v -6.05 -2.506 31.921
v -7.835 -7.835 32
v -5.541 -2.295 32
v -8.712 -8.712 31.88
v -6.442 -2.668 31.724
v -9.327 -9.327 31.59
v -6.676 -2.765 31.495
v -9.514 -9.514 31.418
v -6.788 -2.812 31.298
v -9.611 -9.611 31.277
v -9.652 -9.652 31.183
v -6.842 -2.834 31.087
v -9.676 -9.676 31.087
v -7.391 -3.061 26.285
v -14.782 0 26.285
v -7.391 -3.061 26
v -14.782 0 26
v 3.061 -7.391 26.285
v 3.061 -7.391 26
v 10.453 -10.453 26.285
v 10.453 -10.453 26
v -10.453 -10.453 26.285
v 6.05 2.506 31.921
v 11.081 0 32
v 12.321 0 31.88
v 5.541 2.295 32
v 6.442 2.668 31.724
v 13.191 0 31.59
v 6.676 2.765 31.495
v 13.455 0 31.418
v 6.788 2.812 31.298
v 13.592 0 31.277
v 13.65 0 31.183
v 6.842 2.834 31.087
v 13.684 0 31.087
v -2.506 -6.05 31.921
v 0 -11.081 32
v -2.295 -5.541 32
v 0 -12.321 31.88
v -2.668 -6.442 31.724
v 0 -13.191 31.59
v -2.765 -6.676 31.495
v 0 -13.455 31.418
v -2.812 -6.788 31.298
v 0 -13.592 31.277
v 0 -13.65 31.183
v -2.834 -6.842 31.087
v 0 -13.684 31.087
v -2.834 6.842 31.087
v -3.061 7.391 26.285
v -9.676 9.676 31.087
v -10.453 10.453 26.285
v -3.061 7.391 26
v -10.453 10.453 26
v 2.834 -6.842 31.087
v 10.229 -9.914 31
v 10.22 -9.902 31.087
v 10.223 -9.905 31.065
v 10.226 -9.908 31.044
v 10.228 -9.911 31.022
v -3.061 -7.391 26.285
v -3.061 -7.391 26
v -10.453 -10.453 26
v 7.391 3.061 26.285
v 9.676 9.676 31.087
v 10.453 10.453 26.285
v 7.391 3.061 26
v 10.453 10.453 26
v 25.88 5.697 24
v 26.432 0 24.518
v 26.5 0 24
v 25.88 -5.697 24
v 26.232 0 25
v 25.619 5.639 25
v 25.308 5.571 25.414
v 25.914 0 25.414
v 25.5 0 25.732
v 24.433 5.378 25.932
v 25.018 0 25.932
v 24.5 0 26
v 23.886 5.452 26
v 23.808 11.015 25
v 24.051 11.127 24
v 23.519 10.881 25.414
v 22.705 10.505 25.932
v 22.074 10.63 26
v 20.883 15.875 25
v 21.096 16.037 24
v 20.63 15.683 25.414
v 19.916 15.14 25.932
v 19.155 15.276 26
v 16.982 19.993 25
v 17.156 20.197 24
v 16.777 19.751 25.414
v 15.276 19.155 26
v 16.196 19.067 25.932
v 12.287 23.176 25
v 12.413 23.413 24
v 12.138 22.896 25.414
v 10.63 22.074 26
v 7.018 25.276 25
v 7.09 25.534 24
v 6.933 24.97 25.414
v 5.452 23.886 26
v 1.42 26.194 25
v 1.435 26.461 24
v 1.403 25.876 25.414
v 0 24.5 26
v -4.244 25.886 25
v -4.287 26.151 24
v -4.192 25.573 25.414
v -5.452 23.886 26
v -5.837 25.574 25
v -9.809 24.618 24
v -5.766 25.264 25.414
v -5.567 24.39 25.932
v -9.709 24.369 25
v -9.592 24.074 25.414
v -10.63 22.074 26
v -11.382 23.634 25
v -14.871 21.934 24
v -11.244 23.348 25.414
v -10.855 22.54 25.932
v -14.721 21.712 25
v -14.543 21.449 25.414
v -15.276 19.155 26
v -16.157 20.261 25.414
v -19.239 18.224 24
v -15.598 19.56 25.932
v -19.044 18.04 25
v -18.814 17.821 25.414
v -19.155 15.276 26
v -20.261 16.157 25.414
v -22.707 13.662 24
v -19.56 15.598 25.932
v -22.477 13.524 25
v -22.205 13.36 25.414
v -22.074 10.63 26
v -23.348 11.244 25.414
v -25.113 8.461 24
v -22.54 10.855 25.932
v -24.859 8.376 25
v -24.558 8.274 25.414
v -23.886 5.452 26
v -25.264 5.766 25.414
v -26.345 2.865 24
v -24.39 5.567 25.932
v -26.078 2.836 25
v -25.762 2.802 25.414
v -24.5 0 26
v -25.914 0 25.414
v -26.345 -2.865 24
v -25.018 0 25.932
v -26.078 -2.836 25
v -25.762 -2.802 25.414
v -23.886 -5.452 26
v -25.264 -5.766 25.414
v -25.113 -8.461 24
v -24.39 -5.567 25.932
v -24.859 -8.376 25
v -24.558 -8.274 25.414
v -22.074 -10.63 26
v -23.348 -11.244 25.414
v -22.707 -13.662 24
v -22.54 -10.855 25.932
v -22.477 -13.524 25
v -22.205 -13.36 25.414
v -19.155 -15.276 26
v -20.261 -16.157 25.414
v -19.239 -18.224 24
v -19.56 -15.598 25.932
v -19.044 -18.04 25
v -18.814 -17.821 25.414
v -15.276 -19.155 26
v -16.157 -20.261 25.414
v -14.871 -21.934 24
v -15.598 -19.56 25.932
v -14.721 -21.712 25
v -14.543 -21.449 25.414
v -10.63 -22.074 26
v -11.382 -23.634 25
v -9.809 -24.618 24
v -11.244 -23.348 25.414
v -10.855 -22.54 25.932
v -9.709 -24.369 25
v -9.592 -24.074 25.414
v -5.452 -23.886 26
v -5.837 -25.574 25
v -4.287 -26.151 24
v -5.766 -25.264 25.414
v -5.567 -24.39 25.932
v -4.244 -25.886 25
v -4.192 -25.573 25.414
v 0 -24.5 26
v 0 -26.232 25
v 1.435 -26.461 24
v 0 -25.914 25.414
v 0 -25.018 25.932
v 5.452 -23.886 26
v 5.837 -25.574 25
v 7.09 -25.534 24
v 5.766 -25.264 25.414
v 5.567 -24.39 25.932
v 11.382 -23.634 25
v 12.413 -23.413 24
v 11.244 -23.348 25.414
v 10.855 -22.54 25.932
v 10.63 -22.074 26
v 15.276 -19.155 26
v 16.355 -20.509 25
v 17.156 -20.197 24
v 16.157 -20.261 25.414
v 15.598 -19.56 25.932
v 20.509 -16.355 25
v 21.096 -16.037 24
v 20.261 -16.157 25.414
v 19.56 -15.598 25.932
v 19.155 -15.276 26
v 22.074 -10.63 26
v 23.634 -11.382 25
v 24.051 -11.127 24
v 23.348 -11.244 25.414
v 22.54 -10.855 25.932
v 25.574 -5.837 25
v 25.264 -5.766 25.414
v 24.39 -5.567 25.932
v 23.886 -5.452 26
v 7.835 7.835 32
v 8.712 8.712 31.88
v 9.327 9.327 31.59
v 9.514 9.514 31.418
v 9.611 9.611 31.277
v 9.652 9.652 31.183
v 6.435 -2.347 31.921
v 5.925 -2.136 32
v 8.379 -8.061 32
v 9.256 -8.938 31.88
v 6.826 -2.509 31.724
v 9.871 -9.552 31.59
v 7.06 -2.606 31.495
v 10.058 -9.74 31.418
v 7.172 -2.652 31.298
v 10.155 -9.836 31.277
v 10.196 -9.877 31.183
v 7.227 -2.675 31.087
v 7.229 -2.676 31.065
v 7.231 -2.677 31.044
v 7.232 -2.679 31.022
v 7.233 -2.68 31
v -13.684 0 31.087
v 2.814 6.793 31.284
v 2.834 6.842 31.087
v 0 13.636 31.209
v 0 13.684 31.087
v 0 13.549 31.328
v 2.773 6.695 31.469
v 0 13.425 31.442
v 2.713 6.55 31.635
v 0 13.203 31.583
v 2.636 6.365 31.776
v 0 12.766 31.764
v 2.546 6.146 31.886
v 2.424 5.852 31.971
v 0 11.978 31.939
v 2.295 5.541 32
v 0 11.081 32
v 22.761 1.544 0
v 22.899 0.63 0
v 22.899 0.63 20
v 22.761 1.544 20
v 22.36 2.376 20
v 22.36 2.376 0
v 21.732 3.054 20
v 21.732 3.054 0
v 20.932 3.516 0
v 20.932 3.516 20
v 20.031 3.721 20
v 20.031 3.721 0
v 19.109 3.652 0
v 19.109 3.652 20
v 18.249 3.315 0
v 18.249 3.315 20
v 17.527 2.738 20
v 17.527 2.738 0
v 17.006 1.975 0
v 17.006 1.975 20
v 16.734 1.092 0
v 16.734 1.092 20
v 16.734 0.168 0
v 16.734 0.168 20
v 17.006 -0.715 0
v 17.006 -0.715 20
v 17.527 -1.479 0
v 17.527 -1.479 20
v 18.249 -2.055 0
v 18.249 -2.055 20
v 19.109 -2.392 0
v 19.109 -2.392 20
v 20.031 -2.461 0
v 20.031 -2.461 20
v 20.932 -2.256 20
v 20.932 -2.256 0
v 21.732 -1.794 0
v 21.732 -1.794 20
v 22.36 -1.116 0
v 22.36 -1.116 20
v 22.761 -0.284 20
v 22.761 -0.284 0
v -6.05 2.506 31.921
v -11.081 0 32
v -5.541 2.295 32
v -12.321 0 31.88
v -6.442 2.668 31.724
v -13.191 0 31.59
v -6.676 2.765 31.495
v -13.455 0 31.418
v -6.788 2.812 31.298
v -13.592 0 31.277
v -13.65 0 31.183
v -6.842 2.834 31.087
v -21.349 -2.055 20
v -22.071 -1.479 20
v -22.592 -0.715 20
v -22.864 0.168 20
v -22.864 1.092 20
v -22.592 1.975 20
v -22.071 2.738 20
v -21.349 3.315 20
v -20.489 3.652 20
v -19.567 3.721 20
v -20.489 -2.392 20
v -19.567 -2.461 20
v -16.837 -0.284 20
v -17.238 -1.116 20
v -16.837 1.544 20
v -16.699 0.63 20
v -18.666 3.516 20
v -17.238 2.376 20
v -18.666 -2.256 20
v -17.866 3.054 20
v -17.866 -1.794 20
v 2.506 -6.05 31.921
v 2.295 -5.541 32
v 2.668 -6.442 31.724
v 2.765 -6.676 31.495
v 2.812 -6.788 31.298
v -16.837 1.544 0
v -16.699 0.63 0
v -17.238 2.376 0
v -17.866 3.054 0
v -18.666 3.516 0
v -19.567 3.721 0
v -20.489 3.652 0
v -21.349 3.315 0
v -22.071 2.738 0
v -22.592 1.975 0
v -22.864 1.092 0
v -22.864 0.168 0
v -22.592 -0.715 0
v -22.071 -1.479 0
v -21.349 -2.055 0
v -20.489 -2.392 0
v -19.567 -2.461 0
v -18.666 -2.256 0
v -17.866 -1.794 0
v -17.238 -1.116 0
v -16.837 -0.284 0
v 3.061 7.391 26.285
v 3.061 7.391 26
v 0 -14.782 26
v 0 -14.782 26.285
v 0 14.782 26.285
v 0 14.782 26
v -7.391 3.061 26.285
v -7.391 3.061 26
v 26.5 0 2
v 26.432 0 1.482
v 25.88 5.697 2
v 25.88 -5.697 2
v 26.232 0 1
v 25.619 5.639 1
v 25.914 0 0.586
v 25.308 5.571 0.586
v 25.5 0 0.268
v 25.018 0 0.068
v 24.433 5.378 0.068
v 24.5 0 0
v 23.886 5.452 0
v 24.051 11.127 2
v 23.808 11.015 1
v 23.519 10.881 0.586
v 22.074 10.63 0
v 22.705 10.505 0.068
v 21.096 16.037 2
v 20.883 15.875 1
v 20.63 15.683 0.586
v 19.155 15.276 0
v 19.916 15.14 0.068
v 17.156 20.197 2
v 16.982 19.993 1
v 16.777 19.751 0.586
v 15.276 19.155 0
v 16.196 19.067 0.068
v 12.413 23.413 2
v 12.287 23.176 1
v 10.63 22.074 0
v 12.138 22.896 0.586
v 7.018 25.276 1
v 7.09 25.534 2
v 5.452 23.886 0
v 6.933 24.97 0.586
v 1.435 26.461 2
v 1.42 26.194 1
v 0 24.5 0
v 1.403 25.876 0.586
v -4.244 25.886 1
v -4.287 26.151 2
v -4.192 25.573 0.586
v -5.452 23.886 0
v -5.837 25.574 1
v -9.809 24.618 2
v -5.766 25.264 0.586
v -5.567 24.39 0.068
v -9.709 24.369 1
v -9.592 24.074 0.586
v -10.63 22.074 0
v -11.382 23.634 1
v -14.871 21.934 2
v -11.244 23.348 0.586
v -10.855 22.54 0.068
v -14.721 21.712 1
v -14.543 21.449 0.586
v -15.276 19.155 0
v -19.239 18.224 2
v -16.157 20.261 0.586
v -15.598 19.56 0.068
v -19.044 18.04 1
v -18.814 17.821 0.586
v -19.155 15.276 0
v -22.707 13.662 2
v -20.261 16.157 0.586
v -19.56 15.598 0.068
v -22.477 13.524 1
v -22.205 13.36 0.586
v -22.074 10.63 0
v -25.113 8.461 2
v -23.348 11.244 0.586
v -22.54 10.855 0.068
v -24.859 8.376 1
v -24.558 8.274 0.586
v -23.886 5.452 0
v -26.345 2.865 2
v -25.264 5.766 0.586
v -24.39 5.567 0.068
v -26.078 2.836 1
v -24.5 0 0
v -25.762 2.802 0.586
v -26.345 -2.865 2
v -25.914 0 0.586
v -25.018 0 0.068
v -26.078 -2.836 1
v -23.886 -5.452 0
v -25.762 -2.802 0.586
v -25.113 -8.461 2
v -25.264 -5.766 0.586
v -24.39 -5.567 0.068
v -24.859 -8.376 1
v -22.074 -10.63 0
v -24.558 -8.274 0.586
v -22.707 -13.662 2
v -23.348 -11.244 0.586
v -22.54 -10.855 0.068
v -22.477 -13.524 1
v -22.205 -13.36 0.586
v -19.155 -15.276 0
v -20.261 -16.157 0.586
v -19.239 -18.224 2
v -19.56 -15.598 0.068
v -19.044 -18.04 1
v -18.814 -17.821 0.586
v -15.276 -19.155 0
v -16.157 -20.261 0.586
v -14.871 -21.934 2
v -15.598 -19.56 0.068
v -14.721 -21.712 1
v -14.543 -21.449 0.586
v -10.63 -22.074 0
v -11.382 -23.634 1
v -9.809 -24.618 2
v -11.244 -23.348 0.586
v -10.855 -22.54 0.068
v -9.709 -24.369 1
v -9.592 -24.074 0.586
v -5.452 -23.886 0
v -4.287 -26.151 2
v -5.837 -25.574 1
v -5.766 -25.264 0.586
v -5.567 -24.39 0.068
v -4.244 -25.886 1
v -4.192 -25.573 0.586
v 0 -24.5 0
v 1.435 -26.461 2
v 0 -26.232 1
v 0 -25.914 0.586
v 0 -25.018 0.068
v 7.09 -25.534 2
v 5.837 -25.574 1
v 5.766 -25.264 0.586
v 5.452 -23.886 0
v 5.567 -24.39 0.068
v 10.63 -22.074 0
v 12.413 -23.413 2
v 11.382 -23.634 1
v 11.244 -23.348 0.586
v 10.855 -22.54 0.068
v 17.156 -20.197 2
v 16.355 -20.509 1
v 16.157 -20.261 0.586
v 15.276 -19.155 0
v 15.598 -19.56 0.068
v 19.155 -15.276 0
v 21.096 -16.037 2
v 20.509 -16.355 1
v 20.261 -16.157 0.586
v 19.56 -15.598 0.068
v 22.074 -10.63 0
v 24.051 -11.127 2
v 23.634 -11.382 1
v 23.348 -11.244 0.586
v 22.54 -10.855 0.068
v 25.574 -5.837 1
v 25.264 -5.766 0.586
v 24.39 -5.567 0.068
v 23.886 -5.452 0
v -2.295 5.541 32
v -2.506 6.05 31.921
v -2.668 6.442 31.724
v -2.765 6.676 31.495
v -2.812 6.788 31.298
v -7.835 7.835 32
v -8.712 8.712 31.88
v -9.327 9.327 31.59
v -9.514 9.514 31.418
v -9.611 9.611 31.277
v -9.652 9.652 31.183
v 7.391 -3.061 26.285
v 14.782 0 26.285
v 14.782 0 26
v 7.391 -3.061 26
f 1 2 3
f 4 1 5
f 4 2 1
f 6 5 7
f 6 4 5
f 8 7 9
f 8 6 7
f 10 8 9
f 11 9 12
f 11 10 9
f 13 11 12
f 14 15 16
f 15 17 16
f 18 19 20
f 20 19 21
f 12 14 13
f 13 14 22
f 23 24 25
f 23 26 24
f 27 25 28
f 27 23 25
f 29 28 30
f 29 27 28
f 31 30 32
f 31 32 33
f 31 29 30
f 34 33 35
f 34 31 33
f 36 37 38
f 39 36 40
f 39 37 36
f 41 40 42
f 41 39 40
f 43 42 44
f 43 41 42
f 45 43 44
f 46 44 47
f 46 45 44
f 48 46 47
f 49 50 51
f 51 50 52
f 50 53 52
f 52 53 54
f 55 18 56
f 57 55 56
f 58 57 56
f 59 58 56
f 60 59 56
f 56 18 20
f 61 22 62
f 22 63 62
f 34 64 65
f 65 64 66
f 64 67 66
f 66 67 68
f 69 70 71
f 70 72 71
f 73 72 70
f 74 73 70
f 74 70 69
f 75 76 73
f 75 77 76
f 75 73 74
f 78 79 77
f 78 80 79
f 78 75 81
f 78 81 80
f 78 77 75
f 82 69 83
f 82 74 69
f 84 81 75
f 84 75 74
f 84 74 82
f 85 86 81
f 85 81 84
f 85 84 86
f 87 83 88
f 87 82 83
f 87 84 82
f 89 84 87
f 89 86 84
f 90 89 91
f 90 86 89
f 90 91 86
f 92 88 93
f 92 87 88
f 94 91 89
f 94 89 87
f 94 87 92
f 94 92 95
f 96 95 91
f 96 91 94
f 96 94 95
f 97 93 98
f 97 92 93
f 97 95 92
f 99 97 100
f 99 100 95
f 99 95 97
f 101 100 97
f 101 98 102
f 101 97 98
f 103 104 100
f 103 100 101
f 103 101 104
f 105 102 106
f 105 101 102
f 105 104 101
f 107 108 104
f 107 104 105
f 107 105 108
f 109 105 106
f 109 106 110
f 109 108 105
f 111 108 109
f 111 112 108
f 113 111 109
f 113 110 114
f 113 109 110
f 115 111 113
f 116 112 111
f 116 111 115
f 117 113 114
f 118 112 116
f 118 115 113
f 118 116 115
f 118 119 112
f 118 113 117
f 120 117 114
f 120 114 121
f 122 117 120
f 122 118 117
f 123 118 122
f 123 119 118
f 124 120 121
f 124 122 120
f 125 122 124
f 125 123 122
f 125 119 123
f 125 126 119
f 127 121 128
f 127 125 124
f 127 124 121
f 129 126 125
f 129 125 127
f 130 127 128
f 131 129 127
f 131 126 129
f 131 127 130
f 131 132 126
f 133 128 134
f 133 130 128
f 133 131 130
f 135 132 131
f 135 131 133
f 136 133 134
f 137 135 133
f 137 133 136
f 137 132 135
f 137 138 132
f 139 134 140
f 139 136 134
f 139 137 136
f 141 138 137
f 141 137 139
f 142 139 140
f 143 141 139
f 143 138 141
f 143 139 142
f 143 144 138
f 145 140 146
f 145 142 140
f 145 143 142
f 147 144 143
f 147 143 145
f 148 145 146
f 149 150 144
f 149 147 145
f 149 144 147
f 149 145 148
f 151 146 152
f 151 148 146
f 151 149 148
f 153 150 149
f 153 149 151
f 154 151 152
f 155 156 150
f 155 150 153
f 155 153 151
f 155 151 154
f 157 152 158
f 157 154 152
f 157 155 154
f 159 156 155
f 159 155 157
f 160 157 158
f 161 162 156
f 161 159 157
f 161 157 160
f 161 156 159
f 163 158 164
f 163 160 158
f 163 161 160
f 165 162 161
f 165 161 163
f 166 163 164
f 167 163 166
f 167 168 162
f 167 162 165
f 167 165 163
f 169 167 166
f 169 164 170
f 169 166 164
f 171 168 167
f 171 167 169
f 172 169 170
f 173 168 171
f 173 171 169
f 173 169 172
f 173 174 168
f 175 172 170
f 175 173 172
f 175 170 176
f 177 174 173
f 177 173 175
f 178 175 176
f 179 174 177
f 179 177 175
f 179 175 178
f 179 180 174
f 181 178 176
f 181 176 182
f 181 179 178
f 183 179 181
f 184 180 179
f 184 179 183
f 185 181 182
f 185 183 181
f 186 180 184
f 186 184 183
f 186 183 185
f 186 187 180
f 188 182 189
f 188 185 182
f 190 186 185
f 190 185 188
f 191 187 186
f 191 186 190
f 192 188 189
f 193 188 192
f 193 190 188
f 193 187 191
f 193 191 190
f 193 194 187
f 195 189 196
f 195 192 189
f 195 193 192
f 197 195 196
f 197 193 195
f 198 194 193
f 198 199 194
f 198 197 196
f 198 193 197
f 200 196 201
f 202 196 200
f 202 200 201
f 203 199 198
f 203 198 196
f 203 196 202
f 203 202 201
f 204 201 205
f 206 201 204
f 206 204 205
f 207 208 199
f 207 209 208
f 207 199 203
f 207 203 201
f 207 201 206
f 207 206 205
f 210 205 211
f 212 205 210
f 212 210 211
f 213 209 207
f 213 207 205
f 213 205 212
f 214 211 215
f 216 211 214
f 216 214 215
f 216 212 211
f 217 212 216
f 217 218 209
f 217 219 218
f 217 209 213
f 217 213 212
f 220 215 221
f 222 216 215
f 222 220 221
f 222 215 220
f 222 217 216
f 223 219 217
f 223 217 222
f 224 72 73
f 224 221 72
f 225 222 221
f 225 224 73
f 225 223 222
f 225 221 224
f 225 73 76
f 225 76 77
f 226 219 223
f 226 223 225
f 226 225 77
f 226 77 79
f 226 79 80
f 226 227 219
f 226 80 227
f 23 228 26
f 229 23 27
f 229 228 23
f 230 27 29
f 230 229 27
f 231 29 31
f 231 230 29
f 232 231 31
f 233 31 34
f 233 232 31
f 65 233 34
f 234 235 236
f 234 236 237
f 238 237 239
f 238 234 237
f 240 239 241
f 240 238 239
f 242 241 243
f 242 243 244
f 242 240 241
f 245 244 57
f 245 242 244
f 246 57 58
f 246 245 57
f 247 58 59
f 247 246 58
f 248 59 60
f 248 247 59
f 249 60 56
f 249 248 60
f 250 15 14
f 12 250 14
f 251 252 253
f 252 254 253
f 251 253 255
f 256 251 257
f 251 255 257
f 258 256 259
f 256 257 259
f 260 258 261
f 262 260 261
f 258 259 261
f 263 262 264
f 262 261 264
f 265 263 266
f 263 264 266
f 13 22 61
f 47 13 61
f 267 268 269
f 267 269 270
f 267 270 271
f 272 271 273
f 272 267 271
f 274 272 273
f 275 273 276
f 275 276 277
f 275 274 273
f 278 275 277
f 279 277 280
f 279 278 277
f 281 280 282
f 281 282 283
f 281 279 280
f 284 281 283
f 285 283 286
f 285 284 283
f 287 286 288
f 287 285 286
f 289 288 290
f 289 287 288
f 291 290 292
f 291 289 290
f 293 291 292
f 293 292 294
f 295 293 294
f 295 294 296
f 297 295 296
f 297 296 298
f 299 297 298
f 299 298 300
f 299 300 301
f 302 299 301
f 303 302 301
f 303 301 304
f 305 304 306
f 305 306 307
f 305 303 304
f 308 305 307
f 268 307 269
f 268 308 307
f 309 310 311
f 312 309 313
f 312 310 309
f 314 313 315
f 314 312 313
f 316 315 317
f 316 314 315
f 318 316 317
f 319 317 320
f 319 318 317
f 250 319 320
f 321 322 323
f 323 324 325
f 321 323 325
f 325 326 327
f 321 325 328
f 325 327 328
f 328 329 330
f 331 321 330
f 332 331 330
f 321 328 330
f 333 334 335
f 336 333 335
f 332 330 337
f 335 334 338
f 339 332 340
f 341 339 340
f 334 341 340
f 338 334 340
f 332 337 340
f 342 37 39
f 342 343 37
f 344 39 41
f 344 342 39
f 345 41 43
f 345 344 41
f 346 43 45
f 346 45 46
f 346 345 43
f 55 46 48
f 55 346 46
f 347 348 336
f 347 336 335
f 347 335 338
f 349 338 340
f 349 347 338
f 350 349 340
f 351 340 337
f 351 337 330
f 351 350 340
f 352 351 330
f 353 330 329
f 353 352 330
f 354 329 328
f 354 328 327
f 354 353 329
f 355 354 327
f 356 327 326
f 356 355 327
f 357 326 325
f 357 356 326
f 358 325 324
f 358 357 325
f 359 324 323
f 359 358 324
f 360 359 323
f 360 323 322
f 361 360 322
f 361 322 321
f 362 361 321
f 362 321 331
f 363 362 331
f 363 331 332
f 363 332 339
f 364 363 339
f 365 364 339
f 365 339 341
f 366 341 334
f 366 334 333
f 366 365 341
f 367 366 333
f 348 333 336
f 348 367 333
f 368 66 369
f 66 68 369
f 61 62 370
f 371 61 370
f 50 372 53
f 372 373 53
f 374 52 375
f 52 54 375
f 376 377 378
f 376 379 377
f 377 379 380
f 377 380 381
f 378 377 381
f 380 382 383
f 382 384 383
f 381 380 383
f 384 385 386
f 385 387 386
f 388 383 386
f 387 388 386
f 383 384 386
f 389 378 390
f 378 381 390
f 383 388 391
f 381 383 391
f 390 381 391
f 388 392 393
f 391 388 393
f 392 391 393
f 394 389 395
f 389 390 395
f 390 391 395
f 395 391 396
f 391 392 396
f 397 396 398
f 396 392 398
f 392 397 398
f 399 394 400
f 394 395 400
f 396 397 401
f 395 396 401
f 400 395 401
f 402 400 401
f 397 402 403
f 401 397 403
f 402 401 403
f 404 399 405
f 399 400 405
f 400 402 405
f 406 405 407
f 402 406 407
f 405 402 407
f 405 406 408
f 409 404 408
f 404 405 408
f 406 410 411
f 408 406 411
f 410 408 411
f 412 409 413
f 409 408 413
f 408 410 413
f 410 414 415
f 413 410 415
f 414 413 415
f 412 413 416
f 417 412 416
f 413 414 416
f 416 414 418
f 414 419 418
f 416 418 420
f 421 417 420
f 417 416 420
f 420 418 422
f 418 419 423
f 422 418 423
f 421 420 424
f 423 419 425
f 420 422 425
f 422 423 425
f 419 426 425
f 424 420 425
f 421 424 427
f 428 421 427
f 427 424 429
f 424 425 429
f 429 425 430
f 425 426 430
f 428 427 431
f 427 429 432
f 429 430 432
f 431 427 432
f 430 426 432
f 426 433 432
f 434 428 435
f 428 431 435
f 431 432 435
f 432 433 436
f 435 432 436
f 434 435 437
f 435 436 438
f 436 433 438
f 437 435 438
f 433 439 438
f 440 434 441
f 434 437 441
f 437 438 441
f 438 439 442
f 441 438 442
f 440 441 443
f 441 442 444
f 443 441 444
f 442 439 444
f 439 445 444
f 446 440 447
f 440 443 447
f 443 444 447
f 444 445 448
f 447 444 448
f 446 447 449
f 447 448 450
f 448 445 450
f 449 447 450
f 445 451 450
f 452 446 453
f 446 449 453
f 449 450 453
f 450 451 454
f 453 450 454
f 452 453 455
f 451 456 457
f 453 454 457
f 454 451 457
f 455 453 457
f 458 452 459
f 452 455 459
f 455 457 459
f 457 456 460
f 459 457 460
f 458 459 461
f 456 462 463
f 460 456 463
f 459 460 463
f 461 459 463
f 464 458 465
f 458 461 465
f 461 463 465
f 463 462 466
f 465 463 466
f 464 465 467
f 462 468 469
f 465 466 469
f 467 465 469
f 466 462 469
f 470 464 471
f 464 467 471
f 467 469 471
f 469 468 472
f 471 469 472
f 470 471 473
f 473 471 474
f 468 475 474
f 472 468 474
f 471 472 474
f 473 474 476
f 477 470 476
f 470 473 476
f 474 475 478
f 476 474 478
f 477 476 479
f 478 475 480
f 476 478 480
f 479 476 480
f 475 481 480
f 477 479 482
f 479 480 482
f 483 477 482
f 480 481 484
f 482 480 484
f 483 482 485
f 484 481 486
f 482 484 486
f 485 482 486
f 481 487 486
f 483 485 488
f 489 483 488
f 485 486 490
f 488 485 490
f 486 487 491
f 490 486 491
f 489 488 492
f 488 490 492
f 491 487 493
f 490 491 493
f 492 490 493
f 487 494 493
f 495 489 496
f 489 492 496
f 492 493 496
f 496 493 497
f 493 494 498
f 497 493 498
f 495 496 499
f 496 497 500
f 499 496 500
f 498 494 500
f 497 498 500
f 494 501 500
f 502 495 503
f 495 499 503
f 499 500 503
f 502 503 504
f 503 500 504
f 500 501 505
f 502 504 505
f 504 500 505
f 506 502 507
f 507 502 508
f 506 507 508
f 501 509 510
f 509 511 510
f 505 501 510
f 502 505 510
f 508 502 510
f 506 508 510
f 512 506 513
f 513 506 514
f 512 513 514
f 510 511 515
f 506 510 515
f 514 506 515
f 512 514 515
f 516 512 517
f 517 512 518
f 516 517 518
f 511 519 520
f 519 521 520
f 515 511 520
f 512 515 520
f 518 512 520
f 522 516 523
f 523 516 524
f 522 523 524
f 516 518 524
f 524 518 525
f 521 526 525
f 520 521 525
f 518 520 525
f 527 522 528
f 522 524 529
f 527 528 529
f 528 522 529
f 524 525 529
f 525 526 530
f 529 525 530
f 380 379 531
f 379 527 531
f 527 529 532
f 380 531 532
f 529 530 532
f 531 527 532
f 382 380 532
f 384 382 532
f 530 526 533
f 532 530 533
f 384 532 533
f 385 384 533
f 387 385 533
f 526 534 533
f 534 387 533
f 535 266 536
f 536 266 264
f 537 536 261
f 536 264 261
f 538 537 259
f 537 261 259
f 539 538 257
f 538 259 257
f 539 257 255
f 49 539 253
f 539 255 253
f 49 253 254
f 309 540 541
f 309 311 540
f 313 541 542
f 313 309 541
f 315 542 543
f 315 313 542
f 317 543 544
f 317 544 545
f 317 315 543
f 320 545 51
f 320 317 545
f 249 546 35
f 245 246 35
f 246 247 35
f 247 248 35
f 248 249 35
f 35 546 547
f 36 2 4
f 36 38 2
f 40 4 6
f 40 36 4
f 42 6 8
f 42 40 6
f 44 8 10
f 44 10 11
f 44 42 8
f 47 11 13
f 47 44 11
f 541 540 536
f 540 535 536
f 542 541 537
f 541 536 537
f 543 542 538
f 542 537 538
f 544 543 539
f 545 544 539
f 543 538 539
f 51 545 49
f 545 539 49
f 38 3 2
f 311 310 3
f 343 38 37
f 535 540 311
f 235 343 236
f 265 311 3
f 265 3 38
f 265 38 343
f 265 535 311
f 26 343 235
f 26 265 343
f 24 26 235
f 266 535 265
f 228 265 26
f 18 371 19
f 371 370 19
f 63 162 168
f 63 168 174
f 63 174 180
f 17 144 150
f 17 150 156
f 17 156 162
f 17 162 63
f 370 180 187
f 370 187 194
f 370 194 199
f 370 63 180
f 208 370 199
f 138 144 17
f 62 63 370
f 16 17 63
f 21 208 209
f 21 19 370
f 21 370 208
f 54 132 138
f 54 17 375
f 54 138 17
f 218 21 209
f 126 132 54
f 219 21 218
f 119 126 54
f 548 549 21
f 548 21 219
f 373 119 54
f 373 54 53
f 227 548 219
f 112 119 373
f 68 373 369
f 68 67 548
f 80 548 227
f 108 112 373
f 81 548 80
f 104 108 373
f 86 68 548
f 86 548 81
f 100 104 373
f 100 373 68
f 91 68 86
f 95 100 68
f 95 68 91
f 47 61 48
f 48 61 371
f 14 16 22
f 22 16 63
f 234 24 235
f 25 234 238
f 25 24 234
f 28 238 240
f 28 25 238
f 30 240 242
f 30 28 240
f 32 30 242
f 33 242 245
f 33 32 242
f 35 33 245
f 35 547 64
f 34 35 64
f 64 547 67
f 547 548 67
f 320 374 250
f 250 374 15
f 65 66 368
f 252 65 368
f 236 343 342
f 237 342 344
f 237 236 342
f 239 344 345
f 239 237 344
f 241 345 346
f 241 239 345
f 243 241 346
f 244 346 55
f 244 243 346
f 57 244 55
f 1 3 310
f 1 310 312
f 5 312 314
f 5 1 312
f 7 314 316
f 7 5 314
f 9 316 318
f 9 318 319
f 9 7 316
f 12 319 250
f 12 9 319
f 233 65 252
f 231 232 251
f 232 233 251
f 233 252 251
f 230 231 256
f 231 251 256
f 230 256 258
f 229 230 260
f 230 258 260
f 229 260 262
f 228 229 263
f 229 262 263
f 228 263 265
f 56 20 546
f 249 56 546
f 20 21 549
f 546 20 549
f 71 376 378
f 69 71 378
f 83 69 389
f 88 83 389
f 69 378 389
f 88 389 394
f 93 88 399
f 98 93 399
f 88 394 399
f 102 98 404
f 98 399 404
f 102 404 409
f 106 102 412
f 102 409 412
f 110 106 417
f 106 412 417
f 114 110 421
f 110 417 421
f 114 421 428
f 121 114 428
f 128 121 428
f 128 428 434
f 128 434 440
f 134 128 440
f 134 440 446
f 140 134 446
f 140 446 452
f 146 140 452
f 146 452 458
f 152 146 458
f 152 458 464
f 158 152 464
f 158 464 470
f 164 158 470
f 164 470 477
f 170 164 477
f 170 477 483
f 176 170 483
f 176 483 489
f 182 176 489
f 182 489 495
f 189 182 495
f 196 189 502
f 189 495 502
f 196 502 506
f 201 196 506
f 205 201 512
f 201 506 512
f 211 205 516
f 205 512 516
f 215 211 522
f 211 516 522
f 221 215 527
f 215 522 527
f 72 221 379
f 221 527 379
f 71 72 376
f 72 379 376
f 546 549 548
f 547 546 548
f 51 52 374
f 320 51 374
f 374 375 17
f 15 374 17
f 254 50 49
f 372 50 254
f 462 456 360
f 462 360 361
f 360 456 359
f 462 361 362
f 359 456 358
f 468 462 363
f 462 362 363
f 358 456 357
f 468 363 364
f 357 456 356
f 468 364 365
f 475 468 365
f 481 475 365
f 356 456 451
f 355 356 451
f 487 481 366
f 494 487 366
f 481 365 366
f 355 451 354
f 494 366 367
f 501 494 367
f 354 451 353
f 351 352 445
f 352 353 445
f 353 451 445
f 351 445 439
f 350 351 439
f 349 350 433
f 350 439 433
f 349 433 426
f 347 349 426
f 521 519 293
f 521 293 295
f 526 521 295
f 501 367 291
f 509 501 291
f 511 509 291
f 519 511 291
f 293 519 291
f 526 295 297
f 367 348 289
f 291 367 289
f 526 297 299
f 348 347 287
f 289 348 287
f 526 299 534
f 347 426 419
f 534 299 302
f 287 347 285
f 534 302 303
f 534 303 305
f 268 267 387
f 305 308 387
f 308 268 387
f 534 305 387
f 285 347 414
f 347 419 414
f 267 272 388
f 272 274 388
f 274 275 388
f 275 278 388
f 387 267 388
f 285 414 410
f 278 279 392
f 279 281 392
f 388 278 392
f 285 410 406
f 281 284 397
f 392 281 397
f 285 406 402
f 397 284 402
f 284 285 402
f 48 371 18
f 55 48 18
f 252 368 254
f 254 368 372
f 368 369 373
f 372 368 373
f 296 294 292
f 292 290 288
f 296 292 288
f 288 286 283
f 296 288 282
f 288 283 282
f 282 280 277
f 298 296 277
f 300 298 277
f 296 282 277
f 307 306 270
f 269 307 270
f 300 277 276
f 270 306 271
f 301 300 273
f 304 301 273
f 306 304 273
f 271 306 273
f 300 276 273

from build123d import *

# Parameters (mm, degrees)
F0_R     = 26.5
F0_R_2   = 3.1
F1_DEPTH = 20
F2_R     = 26.5
F3_DEPTH = 6
F4_R     = 2
F6_DEPTH = 6
F7_SIZE2 = 5.7150261514
F7_SIZE  = 0.5
F8_SIZE2 = 5.7150261514
F8_SIZE  = 0.5
F9_R     = 1


with BuildPart() as f1:
    # F0 (on Top) → F1 (new body)
    with BuildSketch(Plane.XY):
        Circle(F0_R)
        with Locations((-19.7989898732, 0.6299423149)):
            Circle(F0_R_2, mode=Mode.SUBTRACT)
        with Locations((19.7989898732, 0.6299423149)):
            Circle(F0_R_2, mode=Mode.SUBTRACT)
    extrude(amount=F1_DEPTH)

    # F2 (on face) → F3 (join)
    with BuildSketch(Plane.XY.offset(20)):
        Circle(F2_R)
    extrude(amount=F3_DEPTH)

    # F4
    f4_edges = [f1.edges().sort_by_distance(p)[0] for p in [
        (-26.5, 0, 26),
        (-26.5, 0, 0),
    ]]
    fillet(f4_edges, radius=F4_R)

    # F5 (on face) → F6 (join)
    with BuildSketch(Plane.XY.offset(26)):
        Polygon((0, 14.7820725202), (-3.0614674589, 7.3910362601), (-10.452503719, 10.452503719), (-7.3910362601, 3.0614674589), (-14.7820725202, 0), (-7.3910362601, -3.0614674589), (-10.452503719, -10.452503719), (-3.0614674589, -7.3910362601), (0, -14.7820725202), (3.0614674589, -7.3910362601), (10.452503719, -10.452503719), (7.3910362601, -3.0614674589), (14.7820725202, 0), (7.3910362601, 3.0614674589), (10.452503719, 10.452503719), (3.0614674589, 7.3910362601), align=None)
    extrude(amount=F6_DEPTH)

    # F7
    f7_edges = [f1.edges().sort_by_distance(p)[0] for p in [
        (6.756986, -8.92177, 32),
        (-1.530734, -11.086554, 32),
        (-8.92177, -6.756986, 32),
        (-11.086554, 1.530734, 32),
        (-6.756986, 8.92177, 32),
        (1.530734, 11.086554, 32),
        (8.92177, 6.756986, 32),
        (11.086554, -1.530734, 32),
    ]]
    f7_side = f1.faces().sort_by_distance((0, 0, 32))[0]
    chamfer(f7_edges, length=F7_SIZE, length2=F7_SIZE2, reference=f7_side)

    # F8
    f8_edges = [f1.edges().sort_by_distance(p)[0] for p in [
        (1.666033, -10.759914, 32),
        (-6.430345, -8.786471, 32),
        (-10.759914, -1.666033, 32),
        (-8.786471, 6.430345, 32),
        (-1.666033, 10.759914, 32),
        (6.430345, 8.786471, 32),
        (10.759914, 1.666033, 32),
    ]]
    f8_side = f1.faces().sort_by_distance((0, 0, 32))[0]
    chamfer(f8_edges, length=F8_SIZE, length2=F8_SIZE2, reference=f8_side)

    # F9
    f9_edges = [f1.edges().sort_by_distance(p)[0] for p in [
        (10.337602, -1.299764, 32),
        (10.337602, 1.299764, 32),
        (7.295365, -2.830498, 32),
        (6.968725, 2.695199, 32),
        (8.786471, -6.430345, 32),
        (6.833426, 3.021839, 32),
        (6.717357, -8.364159, 32),
        (8.22886, 6.390717, 32),
        (3.021839, -6.833426, 32),
        (6.390717, 8.22886, 32),
        (2.695199, -6.968725, 32),
        (3.021839, 6.833426, 32),
        (1.299764, -10.337602, 32),
        (2.695199, 6.968725, 32),
        (-1.299764, -10.337602, 32),
        (1.299764, 10.337602, 32),
        (-2.695199, -6.968725, 32),
        (-1.299764, 10.337602, 32),
        (-3.021839, -6.833426, 32),
        (-2.695199, 6.968725, 32),
        (-6.390717, -8.22886, 32),
        (-3.021839, 6.833426, 32),
        (-8.22886, -6.390717, 32),
        (-6.390717, 8.22886, 32),
        (-6.833426, -3.021839, 32),
        (-8.22886, 6.390717, 32),
        (-6.968725, -2.695199, 32),
        (-6.833426, 3.021839, 32),
        (-10.337602, -1.299764, 32),
        (-6.968725, 2.695199, 32),
        (-10.337602, 1.299764, 32),
    ]]
    fillet(f9_edges, radius=F9_R)


solid = f1.part
